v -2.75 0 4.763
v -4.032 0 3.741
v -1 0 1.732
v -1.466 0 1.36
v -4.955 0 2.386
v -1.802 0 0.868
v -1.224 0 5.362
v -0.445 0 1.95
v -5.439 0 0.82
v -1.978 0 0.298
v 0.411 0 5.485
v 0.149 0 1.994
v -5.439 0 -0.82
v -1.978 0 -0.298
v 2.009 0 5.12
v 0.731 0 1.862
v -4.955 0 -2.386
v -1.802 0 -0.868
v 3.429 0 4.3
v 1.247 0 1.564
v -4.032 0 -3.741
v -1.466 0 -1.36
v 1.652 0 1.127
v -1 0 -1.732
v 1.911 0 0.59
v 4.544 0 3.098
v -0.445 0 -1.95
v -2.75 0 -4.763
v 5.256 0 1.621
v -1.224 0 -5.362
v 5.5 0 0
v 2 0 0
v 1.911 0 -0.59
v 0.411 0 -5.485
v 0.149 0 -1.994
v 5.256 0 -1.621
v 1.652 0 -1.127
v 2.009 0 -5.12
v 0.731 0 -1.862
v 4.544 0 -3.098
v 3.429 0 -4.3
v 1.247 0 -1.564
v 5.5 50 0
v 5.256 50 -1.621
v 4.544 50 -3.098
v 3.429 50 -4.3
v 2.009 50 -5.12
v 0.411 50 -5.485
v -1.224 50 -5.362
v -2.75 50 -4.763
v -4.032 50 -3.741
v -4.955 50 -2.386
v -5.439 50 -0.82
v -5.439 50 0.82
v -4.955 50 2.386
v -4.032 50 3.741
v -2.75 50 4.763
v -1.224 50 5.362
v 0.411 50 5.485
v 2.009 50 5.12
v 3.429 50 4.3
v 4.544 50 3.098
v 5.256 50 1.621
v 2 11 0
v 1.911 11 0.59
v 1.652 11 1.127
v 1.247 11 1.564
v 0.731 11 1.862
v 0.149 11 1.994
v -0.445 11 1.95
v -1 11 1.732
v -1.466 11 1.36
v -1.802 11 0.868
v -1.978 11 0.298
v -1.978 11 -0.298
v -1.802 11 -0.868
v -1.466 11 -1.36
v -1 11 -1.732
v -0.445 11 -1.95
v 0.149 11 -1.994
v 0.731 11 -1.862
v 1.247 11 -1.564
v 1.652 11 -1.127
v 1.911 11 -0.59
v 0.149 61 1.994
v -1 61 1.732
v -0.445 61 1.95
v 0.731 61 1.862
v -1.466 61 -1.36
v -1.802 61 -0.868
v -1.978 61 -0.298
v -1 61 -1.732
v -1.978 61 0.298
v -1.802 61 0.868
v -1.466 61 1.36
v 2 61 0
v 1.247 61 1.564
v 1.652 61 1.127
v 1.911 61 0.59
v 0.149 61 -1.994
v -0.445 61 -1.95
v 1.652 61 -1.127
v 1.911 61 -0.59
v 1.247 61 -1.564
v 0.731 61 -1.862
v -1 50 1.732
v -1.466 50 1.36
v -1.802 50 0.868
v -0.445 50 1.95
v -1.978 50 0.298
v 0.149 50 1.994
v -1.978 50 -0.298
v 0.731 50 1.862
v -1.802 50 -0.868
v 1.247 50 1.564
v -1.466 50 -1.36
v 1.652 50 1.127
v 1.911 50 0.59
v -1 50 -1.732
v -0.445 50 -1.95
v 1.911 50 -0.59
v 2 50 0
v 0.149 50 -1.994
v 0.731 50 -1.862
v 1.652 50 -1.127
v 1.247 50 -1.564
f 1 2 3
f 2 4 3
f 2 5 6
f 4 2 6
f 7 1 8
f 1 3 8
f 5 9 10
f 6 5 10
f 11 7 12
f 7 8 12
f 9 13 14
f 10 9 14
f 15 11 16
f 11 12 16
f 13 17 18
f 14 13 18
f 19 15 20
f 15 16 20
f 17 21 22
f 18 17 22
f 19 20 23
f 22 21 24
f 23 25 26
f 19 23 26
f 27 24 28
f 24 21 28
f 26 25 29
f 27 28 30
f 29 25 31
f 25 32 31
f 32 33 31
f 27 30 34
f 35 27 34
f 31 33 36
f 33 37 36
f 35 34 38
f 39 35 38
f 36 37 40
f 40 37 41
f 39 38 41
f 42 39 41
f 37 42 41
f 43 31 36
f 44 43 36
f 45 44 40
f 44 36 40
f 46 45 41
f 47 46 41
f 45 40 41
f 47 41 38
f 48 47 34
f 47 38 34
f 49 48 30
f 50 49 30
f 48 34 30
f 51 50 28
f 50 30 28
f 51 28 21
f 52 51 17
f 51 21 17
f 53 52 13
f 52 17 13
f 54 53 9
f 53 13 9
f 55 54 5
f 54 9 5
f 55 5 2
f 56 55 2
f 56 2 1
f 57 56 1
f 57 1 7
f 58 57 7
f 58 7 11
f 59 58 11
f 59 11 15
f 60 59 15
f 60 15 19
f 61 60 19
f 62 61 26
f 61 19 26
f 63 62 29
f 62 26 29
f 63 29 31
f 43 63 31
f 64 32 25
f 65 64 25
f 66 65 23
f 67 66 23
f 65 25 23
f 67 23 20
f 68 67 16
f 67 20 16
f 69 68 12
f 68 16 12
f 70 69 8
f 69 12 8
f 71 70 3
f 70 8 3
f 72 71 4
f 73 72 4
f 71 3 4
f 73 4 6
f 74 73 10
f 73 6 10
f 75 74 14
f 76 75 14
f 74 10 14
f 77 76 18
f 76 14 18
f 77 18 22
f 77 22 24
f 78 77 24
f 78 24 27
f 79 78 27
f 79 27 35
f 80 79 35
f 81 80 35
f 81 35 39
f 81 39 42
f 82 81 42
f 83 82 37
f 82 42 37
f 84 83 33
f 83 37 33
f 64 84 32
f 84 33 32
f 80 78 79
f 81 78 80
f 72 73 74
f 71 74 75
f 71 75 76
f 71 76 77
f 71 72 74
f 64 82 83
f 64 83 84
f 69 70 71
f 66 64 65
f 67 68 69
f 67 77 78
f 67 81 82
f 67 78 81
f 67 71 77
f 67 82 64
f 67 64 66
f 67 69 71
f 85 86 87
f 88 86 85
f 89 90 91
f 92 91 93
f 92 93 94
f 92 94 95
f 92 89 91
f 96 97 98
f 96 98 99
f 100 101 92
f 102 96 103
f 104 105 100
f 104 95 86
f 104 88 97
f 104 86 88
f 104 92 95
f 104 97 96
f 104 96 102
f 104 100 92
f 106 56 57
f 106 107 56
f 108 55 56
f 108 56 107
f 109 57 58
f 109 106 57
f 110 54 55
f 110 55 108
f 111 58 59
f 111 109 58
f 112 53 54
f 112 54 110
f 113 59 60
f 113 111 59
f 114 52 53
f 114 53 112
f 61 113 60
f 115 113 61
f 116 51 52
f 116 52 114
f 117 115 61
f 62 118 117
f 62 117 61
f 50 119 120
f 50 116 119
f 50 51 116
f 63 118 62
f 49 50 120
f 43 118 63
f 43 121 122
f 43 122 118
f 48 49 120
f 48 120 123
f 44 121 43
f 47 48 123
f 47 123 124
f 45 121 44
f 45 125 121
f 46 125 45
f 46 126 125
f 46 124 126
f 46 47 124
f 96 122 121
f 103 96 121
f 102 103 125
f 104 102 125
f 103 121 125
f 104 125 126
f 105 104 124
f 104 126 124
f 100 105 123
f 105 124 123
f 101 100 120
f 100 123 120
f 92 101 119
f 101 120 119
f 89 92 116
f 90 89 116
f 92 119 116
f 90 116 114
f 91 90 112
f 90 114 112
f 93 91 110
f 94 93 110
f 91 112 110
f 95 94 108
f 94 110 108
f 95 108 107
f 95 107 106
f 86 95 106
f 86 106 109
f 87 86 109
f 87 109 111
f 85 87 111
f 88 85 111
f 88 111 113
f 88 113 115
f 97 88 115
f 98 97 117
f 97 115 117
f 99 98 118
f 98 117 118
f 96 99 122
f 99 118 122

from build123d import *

# Parameters (mm, degrees)
ESQUISSE1_R             = 5.5
BOSS_EXTRU_1_DEPTH      = 50
ESQUISSE2_R             = 2
BOSS_EXTRU_2_DEPTH      = 11
ESQUISSE3_R             = 2
ENL_V_MAT_EXTRU_1_DEPTH = 11


with BuildPart() as part:
    # Esquisse1 → Boss.-Extru.1 (new body)
    with BuildSketch(Plane(origin=(0, 0, 0), x_dir=(1, 0, 0), z_dir=(0, 1, 0))):
        Circle(ESQUISSE1_R)
    extrude(amount=BOSS_EXTRU_1_DEPTH)

    # Esquisse2 → Boss.-Extru.2 (add)
    with BuildSketch(Plane(origin=(0, 50, 0), x_dir=(1, 0, 0), z_dir=(0, 1, 0))):
        Circle(ESQUISSE2_R)
    extrude(amount=BOSS_EXTRU_2_DEPTH)

    # Esquisse3 → Enlèv. mat.-Extru.1 (cut)
    with BuildSketch(Plane.XZ):
        Circle(ESQUISSE3_R)
    extrude(amount=-ENL_V_MAT_EXTRU_1_DEPTH, mode=Mode.SUBTRACT)


solid = part.part
